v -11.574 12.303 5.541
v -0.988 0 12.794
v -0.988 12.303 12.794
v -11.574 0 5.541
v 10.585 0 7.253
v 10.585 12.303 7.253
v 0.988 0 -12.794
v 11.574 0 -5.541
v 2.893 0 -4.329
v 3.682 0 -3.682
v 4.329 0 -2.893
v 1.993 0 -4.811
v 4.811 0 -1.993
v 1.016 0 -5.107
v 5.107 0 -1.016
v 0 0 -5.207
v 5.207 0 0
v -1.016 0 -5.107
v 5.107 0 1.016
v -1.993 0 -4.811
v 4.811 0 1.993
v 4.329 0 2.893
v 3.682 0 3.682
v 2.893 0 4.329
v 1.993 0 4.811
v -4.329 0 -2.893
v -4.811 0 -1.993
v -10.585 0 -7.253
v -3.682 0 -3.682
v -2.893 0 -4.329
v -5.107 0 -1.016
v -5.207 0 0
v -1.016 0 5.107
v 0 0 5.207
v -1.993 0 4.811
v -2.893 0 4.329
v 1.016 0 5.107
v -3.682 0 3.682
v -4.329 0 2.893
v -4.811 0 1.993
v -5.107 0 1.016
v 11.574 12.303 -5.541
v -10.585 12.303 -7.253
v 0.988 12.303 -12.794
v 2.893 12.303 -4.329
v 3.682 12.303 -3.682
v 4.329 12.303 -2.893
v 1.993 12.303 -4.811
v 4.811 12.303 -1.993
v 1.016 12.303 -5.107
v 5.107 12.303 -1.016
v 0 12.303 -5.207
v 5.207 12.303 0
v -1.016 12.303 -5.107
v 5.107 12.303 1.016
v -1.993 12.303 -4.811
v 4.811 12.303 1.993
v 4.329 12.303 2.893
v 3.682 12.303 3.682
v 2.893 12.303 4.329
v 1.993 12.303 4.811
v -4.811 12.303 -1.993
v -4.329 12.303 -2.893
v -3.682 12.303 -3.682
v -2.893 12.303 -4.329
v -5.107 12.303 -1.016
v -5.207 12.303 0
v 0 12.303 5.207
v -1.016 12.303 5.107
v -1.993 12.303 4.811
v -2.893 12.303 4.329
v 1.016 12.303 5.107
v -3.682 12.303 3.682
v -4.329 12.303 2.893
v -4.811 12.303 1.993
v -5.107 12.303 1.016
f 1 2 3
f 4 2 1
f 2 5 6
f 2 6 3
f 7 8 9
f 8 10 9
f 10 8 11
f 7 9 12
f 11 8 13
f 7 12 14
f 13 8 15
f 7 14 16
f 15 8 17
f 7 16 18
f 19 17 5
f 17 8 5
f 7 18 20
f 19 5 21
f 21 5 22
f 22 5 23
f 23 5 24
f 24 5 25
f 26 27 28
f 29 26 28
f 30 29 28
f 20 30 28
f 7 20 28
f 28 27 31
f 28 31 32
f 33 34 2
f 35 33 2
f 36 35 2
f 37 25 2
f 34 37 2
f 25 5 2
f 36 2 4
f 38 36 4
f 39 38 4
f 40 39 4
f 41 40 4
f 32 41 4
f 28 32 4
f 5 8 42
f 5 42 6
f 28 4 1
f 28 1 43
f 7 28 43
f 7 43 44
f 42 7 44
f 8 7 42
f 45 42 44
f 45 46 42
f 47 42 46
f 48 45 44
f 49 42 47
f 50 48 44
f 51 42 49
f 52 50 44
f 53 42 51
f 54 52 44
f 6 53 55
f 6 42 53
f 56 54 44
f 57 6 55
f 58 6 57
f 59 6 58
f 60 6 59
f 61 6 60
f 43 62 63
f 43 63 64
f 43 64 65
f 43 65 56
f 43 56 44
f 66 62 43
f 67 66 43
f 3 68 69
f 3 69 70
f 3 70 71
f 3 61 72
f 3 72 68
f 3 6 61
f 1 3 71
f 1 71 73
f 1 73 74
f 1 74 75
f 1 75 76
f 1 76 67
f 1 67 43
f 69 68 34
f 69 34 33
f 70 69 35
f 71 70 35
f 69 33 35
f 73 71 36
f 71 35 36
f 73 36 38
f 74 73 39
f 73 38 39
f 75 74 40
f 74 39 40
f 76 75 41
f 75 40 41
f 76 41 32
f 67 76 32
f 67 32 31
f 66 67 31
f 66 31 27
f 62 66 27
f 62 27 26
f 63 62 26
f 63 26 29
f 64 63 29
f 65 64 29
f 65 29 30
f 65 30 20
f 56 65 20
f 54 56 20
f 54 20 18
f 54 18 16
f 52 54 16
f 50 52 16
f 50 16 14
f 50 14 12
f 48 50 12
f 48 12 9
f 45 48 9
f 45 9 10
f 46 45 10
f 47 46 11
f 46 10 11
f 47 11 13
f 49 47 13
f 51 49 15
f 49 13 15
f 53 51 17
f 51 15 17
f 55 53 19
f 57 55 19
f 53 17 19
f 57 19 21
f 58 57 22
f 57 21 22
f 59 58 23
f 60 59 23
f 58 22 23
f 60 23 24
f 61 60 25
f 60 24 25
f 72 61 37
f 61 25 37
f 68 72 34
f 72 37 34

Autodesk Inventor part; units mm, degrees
ref_plane "YZ Plane" through (0, 0, 0) normal (1, 0, 0) x (0, 1, 0)
ref_plane "XZ Plane" through (0, 0, 0) normal (0, 1, 0) x (-1, 0, 0)
ref_plane "XY Plane" through (0, 0, 0) normal (0, 0, 1) x (1, 0, 0)
sketch "Sketch1" plane through (0, 0, 0) normal (0, 1, 0) x (-1, 0, 0)
  line L0 (10.5852, -7.2528) -> (-0.9885, -12.7935)
  line L1 (-0.9885, -12.7935) -> (-11.5737, -5.5406)
  line L2 (-11.5737, -5.5406) -> (-10.5852, 7.2528)
  line L3 (-10.5852, 7.2528) -> (0.9885, 12.7935)
  line L4 (0.9885, 12.7935) -> (11.5737, 5.5406)
  line L5 (11.5737, 5.5406) -> (10.5852, -7.2528)
  point P0 (0, 0)
  point P1 (0, 0)
  dimension "d0" = 22.225
extrude "Extrusion1" add sketch "Sketch1" along normal blind 12.3031
sketch "Sketch2" plane through (0, 12.3031, 0) normal (0, 1, 0) x (1, 0, 0)
  line L0 (-10.5852, 7.2528) -> (-11.5737, -5.5406) construction
  line L1 (11.5737, 5.5406) -> (0.9885, 12.7935) construction
  line L2 (-11.5737, -5.5406) -> (11.5737, 5.5406) construction
  line L3 (10.5852, -7.2528) -> (11.5737, 5.5406) construction
  line L4 (11.5737, 5.5406) -> (10.5852, -7.2528) construction
  line L5 (0.9885, 12.7935) -> (-10.5852, 7.2528) construction
  line L6 (10.5852, -7.2528) -> (-10.5852, 7.2528) construction
  point P0 (0, 0)
hole "Hole1" at (0, 12.3031, 0) direction (0, -1, 0) diameter 10.414 end through all thread size "1/2-12 UNS" class "2B" standard "ANSI Unified Screw Threads"
properties part number "Threaded Rod Nut" material "Aluminum 6061"
